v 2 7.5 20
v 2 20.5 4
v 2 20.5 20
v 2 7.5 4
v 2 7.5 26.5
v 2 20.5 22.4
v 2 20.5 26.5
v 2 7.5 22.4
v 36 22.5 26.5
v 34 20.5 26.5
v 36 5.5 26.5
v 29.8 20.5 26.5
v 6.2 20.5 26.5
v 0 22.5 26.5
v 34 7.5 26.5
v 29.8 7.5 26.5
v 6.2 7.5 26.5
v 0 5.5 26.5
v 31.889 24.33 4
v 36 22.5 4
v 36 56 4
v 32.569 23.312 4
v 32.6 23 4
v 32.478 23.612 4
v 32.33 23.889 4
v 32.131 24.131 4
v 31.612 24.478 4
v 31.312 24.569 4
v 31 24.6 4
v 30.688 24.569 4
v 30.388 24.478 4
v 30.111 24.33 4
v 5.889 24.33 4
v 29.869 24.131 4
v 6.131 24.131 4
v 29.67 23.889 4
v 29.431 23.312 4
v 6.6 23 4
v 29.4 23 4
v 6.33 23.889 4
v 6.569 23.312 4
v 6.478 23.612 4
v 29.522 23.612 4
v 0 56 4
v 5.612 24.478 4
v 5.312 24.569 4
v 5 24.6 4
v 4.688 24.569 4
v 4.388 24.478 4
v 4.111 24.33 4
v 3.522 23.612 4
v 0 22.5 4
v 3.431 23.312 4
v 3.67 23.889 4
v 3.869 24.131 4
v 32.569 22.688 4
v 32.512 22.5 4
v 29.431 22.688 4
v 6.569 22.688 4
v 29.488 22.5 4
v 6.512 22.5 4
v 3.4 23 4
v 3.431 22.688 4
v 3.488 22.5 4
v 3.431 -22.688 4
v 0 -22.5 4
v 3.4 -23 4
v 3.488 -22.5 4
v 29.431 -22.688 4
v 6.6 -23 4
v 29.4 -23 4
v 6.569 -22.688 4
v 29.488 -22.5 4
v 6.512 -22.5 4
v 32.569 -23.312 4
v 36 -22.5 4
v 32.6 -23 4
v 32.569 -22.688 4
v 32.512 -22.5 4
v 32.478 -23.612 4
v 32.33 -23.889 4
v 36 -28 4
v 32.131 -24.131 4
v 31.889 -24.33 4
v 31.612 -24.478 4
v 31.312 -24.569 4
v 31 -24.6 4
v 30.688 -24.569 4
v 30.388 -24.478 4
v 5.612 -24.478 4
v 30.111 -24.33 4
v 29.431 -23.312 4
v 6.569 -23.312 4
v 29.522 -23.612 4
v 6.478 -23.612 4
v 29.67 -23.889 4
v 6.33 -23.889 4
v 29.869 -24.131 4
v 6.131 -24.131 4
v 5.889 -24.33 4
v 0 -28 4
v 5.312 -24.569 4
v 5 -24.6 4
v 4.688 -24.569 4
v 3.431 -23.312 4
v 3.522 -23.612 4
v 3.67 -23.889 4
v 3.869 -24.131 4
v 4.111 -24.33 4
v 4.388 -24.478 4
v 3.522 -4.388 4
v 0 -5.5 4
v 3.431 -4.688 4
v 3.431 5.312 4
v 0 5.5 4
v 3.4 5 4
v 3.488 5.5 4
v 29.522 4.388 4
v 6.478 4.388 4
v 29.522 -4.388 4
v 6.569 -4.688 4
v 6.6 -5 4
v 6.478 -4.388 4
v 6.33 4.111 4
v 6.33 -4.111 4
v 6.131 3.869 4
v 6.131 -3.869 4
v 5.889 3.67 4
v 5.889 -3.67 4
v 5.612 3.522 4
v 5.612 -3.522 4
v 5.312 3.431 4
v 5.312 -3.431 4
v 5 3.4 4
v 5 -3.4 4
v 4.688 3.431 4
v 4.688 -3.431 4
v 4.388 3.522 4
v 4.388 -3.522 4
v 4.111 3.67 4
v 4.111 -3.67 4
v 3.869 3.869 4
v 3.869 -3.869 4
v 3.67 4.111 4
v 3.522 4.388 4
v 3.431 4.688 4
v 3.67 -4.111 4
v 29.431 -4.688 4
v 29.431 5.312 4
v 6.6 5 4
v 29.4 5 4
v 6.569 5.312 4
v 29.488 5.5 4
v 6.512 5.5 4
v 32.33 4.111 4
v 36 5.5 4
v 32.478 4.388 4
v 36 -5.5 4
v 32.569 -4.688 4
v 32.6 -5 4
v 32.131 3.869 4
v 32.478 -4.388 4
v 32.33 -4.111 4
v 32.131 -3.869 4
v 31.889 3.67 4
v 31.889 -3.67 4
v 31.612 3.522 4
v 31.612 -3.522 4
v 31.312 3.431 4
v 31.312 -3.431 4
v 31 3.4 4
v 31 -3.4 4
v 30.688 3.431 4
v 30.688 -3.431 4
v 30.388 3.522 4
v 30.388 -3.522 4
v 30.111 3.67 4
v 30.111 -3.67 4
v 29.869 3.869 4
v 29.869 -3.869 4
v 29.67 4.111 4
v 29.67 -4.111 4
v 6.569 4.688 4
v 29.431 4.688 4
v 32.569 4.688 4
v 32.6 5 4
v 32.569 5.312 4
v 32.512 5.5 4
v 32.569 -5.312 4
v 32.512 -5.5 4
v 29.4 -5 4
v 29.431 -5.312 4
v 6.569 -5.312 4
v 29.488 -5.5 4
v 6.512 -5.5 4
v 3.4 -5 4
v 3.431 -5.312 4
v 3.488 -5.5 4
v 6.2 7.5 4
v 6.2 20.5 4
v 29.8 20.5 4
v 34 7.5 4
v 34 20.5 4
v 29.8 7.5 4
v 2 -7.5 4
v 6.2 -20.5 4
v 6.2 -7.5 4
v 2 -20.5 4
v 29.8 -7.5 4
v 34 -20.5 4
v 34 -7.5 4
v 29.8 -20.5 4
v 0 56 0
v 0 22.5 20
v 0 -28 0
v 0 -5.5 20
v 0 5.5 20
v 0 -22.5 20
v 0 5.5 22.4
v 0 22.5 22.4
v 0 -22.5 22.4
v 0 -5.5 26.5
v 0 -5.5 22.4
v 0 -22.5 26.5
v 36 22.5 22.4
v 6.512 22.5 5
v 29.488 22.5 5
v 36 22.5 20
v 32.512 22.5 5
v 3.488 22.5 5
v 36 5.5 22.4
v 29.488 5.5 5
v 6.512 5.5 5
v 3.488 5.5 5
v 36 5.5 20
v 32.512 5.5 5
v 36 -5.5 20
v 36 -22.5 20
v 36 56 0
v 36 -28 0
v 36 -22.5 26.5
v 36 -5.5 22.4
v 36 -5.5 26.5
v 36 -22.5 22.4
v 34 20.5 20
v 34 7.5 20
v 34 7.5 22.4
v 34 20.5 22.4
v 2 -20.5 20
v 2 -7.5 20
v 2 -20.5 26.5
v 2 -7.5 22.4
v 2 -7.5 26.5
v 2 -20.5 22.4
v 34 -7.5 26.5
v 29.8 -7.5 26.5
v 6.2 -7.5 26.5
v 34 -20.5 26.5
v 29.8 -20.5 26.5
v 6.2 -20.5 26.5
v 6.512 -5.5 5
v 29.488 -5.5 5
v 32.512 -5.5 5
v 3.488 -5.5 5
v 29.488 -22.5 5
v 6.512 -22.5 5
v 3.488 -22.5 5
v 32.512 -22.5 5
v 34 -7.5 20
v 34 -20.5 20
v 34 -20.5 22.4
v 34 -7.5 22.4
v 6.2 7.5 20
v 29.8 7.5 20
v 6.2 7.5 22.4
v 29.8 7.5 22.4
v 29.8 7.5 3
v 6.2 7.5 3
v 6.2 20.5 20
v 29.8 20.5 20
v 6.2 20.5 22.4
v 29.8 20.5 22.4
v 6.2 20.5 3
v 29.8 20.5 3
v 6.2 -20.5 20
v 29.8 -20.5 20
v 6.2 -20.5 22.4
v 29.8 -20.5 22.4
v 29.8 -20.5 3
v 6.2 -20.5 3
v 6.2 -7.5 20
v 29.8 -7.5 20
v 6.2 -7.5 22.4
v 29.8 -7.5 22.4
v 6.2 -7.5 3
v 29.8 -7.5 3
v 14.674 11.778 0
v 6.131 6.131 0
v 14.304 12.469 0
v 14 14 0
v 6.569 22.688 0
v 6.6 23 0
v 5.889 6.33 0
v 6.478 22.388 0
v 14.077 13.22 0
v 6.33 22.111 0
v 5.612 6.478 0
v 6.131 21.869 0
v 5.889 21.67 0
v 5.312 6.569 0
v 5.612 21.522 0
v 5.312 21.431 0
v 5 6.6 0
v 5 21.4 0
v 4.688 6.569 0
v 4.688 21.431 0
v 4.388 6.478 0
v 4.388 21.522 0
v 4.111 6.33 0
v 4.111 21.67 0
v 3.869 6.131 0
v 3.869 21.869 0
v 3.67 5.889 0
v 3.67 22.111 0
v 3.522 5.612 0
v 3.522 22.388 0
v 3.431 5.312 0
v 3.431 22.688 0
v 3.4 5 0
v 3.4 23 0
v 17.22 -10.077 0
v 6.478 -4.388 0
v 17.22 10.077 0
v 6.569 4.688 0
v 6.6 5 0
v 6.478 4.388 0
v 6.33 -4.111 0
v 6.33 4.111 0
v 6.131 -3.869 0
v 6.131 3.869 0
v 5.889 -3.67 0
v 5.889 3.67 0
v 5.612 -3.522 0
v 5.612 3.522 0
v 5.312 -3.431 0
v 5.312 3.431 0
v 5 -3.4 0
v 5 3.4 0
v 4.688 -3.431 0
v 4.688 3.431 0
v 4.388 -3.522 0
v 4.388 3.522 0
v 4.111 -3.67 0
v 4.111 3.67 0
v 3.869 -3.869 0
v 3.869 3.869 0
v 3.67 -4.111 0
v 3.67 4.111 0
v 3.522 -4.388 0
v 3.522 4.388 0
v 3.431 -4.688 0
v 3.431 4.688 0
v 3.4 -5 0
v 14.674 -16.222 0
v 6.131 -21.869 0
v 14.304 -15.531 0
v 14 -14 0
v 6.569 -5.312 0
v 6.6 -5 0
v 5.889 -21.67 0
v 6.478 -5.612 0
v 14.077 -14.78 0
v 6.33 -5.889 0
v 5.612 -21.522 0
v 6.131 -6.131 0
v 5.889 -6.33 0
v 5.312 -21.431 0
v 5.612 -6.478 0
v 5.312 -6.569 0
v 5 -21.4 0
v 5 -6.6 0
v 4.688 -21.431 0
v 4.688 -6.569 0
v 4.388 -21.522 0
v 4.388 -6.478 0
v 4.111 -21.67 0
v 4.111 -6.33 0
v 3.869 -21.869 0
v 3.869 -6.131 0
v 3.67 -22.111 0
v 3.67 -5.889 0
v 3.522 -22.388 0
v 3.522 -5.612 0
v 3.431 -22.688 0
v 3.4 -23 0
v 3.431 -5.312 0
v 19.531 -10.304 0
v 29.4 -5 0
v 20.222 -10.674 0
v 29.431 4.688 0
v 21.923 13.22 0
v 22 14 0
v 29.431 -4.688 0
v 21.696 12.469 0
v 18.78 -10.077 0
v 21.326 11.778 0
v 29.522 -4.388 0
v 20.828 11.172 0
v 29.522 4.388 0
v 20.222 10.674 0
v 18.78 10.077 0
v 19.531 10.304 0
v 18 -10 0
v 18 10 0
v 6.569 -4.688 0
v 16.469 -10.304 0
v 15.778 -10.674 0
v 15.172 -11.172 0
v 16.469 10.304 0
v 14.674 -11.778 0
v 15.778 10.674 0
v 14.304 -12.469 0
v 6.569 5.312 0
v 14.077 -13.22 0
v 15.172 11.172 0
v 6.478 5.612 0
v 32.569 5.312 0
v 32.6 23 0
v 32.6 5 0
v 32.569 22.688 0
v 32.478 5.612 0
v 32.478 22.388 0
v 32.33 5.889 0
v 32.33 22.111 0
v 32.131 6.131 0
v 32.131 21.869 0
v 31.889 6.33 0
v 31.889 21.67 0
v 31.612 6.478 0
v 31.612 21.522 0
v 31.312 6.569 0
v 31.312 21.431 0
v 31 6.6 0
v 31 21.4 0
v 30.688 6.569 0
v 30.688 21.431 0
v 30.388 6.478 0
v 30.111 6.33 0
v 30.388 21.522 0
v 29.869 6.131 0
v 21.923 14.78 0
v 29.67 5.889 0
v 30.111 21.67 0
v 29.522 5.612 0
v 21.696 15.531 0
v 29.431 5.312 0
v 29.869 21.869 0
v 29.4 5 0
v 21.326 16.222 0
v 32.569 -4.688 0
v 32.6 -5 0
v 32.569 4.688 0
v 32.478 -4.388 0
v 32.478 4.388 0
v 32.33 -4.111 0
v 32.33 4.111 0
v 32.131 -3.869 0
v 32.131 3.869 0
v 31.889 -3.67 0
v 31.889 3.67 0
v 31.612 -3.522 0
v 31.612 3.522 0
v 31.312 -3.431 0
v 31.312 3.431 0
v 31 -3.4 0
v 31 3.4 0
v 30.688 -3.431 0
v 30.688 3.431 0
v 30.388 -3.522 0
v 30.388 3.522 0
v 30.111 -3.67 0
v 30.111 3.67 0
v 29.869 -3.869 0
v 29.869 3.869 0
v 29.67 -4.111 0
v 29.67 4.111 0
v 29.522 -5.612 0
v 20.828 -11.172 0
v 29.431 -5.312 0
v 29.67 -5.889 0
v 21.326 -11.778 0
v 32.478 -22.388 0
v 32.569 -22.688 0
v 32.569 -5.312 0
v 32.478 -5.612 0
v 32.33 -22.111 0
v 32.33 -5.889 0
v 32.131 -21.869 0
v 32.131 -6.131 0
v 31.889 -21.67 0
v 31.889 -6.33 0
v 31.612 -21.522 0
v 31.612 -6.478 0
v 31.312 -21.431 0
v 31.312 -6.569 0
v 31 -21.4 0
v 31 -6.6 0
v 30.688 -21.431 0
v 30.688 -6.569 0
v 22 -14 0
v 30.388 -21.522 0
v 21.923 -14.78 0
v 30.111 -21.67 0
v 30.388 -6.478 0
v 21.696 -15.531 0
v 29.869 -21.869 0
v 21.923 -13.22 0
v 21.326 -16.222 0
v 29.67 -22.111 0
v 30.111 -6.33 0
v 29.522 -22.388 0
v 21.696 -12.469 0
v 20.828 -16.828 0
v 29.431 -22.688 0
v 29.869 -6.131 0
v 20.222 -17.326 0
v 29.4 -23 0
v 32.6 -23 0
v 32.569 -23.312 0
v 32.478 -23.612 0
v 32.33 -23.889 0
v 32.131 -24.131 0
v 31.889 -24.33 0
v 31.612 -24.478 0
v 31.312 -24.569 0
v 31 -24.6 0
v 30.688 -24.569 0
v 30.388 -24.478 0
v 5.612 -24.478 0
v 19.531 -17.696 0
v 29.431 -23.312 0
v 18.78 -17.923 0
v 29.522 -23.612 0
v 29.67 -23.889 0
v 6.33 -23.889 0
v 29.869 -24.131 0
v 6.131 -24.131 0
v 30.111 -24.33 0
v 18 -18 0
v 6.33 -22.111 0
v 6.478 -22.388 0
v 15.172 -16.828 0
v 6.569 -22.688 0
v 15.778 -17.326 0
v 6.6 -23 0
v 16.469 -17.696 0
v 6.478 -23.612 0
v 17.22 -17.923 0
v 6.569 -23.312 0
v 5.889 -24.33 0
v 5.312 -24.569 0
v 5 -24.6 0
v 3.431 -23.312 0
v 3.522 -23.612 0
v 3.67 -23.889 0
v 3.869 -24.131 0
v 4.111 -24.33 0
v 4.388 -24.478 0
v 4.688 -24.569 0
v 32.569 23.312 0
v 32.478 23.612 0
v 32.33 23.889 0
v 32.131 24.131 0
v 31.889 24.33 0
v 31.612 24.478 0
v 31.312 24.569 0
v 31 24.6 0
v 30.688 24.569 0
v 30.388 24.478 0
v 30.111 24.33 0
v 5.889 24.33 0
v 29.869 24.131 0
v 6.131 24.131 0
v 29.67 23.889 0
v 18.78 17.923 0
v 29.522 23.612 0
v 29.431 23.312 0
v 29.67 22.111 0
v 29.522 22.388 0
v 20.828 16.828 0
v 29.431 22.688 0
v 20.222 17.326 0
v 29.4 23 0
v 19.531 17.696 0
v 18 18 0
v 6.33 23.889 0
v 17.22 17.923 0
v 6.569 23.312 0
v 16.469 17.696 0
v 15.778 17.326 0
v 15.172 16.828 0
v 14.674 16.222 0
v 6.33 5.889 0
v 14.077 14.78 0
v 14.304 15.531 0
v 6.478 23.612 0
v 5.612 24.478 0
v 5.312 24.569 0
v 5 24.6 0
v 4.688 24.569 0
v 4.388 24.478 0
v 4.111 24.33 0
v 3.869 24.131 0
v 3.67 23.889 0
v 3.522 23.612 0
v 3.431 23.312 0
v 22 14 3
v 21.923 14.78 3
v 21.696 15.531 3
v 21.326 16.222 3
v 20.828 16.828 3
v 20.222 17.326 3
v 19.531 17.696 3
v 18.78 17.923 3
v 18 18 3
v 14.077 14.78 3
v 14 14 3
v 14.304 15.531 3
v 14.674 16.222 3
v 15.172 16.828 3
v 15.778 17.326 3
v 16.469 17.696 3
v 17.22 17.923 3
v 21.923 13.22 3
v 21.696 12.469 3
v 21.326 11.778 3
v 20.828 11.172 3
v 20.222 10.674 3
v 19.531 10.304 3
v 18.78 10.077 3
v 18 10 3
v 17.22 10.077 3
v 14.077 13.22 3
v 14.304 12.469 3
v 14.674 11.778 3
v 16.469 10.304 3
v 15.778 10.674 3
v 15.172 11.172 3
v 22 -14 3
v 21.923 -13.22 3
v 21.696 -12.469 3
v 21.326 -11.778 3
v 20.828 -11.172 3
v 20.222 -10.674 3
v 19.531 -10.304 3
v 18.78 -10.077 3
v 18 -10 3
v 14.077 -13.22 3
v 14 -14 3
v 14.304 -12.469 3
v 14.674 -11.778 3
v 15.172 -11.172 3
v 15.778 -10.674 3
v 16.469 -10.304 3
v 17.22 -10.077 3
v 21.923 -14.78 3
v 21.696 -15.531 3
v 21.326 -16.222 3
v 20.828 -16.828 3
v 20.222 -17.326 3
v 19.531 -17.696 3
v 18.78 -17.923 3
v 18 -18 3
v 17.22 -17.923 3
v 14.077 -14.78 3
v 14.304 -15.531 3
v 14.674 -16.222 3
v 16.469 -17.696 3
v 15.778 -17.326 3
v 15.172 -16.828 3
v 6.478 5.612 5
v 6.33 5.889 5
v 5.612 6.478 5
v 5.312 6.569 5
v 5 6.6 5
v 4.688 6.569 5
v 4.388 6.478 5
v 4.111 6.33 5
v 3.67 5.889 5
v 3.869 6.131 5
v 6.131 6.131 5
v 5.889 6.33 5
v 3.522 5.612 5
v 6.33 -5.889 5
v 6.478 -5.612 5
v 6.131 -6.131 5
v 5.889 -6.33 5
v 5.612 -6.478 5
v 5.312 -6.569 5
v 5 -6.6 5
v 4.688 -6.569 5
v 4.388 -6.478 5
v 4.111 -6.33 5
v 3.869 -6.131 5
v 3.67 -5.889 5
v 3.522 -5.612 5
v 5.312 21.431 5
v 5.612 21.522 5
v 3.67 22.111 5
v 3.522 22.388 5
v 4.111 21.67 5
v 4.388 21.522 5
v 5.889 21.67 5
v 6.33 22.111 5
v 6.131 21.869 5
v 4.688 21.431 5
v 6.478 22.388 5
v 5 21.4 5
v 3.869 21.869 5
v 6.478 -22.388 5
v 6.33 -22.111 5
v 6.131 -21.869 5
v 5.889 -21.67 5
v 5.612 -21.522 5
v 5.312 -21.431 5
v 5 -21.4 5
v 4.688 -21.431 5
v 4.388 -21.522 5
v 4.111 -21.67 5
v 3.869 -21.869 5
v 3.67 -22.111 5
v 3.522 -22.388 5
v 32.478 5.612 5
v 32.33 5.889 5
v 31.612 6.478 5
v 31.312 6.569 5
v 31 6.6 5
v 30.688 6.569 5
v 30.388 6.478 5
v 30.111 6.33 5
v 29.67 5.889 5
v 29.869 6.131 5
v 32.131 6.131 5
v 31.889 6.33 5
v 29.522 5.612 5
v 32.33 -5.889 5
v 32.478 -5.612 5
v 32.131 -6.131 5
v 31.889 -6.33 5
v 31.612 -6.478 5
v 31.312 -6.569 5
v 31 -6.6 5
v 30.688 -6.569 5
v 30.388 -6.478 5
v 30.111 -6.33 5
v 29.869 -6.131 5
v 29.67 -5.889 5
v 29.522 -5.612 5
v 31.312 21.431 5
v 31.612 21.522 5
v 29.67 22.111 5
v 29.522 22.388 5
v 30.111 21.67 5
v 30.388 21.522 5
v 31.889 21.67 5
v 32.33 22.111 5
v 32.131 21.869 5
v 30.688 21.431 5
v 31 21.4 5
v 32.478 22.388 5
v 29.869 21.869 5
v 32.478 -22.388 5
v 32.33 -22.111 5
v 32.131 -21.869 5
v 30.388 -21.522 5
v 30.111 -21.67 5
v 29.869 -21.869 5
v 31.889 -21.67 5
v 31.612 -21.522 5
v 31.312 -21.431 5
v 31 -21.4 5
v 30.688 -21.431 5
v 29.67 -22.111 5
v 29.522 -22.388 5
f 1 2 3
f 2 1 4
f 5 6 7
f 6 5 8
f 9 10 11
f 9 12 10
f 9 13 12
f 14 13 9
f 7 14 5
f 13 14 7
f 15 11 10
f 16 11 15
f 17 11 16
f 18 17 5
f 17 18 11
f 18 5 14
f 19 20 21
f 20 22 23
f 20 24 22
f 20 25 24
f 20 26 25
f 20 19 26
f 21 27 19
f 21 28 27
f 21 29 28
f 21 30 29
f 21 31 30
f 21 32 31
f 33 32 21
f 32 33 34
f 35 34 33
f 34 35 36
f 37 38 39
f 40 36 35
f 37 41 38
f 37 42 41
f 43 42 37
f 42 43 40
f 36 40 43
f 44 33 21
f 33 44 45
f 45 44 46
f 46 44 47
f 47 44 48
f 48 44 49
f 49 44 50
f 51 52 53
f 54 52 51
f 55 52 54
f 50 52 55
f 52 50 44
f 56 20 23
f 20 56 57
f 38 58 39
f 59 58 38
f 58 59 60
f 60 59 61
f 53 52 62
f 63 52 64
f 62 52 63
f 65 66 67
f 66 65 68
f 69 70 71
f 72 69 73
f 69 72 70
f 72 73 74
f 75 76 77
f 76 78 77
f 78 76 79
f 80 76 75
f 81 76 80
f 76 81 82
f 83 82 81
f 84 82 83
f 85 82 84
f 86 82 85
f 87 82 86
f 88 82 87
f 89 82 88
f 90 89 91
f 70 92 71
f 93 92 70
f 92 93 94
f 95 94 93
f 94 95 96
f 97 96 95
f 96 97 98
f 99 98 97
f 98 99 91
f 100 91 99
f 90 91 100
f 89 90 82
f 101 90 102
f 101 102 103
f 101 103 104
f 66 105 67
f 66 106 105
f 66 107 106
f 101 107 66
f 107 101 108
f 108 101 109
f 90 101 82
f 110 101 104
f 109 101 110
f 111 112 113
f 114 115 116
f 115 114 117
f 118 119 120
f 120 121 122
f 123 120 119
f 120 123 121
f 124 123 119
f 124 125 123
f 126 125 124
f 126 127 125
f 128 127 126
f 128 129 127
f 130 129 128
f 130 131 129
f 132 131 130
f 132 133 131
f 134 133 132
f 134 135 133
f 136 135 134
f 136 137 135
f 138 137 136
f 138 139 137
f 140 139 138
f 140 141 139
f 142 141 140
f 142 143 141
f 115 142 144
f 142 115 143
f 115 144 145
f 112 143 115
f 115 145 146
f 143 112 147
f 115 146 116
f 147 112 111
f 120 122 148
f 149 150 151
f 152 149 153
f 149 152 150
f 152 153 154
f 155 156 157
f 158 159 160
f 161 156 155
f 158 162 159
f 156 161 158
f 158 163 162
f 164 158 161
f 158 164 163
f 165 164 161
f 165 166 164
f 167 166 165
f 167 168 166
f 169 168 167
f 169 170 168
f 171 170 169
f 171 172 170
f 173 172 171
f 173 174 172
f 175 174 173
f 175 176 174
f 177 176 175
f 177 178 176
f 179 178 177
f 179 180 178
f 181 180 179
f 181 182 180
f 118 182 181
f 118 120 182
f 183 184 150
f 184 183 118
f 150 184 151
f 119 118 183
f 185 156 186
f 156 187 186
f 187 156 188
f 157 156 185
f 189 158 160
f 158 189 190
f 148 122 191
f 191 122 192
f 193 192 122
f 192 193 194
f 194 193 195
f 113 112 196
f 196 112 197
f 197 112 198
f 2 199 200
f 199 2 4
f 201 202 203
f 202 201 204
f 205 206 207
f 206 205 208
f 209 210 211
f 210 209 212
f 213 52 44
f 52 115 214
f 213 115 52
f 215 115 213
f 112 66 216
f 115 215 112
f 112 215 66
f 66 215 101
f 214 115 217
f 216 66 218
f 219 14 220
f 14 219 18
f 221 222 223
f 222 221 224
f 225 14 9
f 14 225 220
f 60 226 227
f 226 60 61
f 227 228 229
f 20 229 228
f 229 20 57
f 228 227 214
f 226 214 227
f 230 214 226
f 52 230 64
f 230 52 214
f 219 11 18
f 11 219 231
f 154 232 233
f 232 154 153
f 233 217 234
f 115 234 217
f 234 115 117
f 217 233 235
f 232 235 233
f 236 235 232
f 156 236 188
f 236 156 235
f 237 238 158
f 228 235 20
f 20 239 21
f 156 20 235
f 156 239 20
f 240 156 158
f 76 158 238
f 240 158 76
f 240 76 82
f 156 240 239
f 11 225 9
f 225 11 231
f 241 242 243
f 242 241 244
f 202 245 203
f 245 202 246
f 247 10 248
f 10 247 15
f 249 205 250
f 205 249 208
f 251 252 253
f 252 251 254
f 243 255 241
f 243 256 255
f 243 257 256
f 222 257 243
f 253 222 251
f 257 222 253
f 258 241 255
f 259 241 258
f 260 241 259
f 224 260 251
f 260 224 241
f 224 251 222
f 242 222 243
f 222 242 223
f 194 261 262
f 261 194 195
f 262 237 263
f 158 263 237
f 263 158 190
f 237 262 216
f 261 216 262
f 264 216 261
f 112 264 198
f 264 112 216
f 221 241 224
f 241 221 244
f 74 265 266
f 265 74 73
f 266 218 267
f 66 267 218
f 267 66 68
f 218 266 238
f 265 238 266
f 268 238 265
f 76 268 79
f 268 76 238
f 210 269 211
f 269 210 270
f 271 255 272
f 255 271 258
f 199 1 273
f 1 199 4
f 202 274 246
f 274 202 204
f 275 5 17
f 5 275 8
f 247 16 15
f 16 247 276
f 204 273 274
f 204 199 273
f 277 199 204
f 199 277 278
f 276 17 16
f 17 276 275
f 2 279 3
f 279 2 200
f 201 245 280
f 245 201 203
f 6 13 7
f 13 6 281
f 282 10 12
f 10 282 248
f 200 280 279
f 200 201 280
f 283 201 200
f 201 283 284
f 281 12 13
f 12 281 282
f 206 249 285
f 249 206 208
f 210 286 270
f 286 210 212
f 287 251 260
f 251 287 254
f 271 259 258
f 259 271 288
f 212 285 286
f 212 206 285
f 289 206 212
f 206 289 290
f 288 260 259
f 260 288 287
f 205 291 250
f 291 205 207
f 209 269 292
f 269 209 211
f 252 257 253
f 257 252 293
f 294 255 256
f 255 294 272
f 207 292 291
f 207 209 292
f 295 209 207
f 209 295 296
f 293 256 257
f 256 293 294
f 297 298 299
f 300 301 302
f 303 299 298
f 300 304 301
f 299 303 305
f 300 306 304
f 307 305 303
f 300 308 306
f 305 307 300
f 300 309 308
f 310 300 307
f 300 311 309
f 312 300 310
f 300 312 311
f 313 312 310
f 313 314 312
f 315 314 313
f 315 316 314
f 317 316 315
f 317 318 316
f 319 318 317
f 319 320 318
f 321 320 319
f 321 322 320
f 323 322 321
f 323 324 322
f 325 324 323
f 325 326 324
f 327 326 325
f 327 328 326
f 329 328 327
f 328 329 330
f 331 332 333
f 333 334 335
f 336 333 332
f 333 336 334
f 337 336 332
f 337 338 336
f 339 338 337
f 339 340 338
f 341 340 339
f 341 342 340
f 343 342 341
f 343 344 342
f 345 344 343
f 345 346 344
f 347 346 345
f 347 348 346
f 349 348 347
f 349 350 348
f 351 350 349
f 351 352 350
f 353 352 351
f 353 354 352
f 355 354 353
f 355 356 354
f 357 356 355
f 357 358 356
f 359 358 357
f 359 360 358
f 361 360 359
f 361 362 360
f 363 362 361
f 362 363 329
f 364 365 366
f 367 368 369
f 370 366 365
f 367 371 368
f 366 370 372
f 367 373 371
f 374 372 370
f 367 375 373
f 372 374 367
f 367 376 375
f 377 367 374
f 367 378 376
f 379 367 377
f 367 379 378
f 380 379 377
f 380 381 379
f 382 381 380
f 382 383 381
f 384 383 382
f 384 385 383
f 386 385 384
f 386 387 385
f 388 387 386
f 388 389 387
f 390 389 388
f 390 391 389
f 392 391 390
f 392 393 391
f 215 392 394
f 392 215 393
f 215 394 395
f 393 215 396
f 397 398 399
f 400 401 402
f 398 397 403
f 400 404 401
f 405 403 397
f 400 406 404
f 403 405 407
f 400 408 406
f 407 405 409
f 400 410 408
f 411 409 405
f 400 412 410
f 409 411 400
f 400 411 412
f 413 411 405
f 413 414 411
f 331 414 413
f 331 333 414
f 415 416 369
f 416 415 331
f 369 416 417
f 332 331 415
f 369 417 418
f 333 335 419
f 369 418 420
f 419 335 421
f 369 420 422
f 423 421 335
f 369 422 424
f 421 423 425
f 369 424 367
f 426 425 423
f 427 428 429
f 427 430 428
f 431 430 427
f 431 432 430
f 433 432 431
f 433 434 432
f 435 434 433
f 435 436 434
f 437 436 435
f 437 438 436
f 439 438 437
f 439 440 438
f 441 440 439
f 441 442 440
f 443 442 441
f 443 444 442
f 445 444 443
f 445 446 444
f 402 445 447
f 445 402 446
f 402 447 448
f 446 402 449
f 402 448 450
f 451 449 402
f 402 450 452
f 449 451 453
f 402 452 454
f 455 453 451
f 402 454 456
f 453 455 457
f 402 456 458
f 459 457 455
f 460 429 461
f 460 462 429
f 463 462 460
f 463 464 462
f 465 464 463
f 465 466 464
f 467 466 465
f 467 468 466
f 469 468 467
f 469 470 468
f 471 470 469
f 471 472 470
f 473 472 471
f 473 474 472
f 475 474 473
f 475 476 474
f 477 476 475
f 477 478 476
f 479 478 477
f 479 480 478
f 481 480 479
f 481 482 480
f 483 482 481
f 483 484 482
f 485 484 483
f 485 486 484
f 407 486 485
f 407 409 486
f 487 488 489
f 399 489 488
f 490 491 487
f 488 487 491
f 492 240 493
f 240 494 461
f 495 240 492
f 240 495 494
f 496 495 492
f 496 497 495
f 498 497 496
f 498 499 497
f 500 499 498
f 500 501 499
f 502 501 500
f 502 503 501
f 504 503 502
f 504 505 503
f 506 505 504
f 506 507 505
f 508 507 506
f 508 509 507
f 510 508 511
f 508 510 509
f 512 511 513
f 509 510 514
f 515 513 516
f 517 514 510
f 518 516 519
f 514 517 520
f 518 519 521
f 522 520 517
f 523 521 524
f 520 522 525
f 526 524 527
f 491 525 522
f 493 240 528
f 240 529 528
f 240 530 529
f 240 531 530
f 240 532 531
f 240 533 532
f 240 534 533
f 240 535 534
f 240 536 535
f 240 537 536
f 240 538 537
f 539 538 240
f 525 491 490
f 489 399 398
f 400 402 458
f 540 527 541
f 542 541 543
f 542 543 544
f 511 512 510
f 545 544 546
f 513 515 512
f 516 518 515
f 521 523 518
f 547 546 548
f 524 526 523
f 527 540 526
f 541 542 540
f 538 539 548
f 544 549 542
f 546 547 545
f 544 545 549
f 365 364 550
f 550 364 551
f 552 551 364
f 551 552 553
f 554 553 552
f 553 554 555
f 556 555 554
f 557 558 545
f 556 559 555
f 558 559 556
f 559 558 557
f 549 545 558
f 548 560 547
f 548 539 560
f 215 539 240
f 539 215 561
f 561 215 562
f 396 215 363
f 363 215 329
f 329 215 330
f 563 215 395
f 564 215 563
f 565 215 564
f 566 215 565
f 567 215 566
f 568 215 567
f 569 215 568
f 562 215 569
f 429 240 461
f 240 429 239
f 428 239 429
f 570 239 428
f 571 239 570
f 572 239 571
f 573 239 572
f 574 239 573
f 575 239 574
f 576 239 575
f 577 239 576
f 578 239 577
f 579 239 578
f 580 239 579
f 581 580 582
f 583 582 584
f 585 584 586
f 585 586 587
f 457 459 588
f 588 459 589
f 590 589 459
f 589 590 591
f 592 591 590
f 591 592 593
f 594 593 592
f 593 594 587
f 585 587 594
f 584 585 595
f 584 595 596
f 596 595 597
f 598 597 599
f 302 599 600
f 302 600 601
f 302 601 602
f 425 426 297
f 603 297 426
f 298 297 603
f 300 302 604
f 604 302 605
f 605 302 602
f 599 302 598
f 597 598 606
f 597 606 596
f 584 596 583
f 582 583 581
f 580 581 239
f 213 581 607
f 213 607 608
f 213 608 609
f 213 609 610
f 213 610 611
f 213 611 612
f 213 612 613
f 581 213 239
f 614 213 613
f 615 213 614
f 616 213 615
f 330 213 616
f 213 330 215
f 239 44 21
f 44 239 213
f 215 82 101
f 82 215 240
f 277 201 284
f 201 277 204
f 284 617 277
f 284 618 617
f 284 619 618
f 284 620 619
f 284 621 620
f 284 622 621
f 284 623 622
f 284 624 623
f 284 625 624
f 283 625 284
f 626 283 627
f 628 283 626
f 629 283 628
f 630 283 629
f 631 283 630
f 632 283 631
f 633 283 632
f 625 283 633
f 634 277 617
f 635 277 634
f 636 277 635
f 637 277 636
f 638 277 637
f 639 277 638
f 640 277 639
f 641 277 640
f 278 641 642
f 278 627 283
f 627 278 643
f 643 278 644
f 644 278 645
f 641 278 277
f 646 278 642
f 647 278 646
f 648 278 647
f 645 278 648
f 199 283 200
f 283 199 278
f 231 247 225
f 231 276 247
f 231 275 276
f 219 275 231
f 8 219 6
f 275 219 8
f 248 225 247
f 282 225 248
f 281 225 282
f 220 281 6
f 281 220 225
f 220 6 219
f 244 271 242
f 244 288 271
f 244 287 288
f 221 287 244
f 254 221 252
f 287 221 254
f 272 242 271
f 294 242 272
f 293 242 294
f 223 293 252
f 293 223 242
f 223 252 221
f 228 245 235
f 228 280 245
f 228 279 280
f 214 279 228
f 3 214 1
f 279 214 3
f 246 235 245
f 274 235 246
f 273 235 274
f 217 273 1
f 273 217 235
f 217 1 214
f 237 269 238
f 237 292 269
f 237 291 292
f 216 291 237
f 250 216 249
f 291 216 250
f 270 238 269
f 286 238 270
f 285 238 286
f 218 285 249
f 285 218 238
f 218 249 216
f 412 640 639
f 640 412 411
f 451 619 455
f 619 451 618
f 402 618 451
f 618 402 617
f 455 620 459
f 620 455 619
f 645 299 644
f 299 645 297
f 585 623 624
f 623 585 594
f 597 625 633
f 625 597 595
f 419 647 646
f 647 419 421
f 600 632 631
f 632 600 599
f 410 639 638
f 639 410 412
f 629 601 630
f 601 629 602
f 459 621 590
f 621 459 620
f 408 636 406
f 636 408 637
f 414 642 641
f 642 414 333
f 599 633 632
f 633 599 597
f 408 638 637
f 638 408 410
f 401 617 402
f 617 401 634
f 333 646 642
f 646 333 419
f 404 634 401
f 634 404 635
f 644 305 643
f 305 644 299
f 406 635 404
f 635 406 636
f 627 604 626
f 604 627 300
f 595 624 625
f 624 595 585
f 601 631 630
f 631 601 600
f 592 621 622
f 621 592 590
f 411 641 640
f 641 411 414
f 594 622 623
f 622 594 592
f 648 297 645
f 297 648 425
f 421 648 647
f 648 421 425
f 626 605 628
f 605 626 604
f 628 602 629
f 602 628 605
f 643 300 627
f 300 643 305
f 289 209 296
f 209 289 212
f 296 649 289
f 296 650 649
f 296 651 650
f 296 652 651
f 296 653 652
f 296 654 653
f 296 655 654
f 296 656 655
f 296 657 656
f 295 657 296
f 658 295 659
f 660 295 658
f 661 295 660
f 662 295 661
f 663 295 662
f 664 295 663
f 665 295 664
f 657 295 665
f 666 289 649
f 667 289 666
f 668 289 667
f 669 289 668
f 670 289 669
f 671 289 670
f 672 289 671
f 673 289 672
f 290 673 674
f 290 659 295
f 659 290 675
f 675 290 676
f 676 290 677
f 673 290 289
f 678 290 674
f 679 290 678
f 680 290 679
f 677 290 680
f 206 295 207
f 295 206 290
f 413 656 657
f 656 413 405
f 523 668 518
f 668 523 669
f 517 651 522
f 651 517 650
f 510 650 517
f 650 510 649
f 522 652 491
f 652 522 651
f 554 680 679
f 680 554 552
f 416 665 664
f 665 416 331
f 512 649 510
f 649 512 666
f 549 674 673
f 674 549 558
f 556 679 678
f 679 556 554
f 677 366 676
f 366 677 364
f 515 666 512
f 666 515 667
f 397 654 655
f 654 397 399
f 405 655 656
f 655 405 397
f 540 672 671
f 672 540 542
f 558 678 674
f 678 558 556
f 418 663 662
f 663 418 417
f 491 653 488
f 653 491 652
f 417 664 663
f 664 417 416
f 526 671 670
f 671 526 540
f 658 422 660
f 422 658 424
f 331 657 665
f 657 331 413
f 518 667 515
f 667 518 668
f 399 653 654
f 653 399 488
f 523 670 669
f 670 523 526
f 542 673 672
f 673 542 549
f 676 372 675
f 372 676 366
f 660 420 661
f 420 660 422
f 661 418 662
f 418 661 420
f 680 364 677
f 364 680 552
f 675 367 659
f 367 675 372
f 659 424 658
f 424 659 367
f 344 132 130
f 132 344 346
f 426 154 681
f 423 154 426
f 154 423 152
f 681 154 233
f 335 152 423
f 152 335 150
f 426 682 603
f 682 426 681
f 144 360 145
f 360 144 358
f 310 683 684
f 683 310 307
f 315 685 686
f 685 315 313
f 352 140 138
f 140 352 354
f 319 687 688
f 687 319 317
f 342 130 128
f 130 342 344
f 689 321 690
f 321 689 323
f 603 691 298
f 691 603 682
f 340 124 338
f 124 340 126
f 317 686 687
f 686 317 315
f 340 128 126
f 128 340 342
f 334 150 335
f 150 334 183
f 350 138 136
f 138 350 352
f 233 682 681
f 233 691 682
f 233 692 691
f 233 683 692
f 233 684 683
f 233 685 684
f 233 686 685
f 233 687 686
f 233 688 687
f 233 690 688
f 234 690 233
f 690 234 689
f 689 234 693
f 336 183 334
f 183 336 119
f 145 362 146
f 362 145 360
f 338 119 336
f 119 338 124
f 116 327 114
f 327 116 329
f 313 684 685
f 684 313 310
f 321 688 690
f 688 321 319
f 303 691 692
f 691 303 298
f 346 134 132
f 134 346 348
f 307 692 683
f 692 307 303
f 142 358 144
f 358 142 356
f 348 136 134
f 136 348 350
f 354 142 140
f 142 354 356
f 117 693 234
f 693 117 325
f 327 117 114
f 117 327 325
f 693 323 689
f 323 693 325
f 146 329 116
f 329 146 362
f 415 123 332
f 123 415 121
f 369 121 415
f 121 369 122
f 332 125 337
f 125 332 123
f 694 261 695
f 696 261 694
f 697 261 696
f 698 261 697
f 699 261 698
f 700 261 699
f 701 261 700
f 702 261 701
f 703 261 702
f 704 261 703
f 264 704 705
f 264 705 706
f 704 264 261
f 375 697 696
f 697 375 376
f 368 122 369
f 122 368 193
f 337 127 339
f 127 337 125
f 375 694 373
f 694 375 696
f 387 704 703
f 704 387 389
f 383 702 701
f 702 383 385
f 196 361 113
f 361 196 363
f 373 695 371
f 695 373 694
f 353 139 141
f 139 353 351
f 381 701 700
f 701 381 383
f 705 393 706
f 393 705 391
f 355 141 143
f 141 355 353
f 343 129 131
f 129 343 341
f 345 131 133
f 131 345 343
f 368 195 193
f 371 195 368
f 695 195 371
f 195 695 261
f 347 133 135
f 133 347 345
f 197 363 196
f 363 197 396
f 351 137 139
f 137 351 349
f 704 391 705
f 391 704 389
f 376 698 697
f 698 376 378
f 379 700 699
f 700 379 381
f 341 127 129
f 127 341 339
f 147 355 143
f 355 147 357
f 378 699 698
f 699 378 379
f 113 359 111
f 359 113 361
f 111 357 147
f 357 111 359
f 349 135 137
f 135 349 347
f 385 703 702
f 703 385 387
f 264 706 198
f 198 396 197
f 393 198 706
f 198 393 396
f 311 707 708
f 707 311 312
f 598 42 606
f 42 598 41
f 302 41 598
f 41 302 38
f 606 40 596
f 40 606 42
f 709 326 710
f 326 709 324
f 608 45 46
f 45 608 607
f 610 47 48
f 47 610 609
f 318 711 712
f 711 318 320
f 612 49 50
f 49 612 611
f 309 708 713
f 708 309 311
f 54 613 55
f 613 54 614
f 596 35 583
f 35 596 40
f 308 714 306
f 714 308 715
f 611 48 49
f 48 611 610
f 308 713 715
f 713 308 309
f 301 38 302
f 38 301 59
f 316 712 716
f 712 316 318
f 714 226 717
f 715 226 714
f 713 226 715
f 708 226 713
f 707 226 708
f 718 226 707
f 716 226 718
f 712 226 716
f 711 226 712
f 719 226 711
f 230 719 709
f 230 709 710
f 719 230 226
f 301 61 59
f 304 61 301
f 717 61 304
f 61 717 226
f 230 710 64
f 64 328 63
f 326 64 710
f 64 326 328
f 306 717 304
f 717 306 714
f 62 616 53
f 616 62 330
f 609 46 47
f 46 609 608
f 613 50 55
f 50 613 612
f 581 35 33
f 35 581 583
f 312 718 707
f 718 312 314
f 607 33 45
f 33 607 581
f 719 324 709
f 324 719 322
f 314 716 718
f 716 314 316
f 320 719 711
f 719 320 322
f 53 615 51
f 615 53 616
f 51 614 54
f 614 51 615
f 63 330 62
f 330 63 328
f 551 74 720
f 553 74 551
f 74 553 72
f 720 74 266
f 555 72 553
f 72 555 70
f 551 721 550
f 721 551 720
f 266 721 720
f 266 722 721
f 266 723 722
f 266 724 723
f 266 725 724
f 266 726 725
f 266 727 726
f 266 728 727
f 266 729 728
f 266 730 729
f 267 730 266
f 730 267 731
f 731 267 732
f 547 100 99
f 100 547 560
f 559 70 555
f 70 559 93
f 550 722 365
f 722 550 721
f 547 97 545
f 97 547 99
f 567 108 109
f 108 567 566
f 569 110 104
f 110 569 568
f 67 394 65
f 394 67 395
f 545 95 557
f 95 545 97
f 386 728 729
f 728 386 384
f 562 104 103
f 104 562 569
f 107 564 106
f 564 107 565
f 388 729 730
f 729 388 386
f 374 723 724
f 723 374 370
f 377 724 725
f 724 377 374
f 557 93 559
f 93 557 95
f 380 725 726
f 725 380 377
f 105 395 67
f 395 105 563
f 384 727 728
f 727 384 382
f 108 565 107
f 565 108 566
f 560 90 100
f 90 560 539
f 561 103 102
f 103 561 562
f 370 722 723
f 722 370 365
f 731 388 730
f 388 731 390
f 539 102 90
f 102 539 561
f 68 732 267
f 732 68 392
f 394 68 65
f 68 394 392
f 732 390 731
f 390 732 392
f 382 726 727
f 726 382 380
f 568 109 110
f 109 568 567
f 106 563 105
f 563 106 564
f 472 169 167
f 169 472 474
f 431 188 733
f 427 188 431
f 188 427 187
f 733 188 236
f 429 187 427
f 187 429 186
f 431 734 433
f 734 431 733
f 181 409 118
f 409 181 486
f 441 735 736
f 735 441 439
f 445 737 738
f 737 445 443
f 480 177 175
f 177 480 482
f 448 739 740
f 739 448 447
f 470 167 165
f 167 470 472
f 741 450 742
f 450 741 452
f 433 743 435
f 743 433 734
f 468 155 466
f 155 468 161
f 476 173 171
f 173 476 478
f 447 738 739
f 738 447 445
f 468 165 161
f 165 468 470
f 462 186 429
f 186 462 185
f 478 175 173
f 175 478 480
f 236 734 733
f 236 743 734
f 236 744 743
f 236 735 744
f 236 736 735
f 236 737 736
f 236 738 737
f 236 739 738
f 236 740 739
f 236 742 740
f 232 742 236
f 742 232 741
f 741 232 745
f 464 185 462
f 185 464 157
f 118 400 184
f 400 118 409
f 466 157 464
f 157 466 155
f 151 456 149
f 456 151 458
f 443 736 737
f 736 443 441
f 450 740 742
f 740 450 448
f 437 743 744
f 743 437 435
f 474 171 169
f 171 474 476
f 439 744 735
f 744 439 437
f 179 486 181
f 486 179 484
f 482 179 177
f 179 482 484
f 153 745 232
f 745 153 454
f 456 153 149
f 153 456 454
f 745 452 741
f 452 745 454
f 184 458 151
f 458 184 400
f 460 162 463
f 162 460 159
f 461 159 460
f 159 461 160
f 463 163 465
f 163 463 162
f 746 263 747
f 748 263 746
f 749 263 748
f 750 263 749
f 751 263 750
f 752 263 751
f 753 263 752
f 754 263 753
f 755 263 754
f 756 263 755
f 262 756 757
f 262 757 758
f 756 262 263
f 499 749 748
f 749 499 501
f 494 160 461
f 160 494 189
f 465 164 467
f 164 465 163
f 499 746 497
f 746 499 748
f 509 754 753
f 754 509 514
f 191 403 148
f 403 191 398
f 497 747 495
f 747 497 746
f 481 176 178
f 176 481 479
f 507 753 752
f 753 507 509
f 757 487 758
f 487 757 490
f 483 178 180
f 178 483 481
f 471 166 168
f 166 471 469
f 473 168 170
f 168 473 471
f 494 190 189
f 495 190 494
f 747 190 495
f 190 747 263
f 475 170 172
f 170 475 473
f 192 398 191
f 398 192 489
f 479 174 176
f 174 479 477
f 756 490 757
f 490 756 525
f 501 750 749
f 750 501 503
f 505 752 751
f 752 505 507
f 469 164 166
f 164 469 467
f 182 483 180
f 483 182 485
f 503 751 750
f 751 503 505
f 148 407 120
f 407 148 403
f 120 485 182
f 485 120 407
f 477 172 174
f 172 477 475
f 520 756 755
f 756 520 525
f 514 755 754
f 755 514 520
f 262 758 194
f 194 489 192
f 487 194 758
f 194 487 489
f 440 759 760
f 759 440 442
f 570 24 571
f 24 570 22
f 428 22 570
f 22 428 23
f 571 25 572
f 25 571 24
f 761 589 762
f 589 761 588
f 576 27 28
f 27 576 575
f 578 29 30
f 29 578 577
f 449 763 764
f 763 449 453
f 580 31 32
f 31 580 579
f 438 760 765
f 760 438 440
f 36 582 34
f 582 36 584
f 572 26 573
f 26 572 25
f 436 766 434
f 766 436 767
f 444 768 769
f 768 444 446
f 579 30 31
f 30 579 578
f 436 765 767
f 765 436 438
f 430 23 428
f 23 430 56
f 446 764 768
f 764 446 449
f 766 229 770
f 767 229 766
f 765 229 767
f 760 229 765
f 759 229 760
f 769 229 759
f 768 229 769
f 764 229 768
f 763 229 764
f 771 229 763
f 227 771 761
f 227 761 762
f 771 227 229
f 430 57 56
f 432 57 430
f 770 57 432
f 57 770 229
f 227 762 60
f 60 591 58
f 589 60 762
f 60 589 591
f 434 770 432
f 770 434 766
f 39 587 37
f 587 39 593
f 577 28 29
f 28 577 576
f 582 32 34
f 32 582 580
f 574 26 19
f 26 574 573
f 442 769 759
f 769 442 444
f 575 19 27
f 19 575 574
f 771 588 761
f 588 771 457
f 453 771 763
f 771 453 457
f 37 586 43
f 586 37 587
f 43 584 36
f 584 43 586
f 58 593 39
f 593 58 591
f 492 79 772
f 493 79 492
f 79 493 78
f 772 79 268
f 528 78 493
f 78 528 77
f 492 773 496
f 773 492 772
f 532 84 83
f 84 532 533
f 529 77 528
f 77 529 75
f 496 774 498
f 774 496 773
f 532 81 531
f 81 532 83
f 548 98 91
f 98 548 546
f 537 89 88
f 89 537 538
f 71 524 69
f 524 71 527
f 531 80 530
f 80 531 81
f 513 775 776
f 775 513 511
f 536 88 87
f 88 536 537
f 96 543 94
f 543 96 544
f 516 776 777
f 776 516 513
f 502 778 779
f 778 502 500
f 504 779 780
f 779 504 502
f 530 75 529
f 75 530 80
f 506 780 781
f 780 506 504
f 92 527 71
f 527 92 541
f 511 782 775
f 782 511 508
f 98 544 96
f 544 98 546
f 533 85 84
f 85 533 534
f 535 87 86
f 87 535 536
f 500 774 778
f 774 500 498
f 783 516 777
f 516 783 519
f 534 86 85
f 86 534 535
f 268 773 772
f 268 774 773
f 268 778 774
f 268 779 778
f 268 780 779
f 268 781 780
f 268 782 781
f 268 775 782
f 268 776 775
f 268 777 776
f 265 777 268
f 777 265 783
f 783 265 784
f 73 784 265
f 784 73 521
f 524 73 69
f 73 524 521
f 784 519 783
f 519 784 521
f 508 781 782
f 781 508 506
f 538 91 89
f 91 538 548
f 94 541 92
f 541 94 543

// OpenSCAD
// Montazni deska pro serva kormidel (elevator + rudder)
// Micro servo MG90S/SG90 (9g, 22.8x12.2x25.4mm)
// Umisteni: uvnitr trup_zadni, X=320-340mm od predni strany
// Material: PET-G, 30% vypln, 4 perimetry
// Fixace: epoxid na vnitrni stenu trupu

$fn = 32;

// Rozměry serva MG90S
servo_dl = 22.8;
servo_sir = 12.2;
servo_v = 25.4;   // vcetne hrídele
servo_v_telo = 22.5; // telo bez hrídele
servo_priruba_sirka = 32.5;
servo_priruba_v = 2;
servo_priruba_pos = 16; // od spodku tela
vule = 0.4;

// Rozmery desky
deska_tl = 4;       // tloustka zakladny
deska_sirka = 56;   // v ose Y (dve serva vedle sebe + okraje)
deska_delka = 36;   // v ose X (podél trupu)
vyska = servo_v_telo + deska_tl + 2; // celkova vyska modulu

// Pozice serv na desce (v ose Y)
// Servo 1: vyskove kormidlo (levy pohled - Y > 0)
// Servo 2: smerove kormidlo (pravy pohled - Y < 0)
pos_elevator_y = 14;   // stred serva od středu desky
pos_rudder_y  = -14;

module servo_bay(cy) {
    translate([deska_delka/2, cy, deska_tl])
        difference() {
            // Obal serva (s pridanou vulit)
            translate([-(servo_dl/2 + vule), -(servo_sir/2 + vule), 0])
                cube([servo_dl + 2*vule, servo_sir + 2*vule, servo_v_telo + 2]);
        }
}

module servo_mount_kormidla() {
    difference() {
        union() {
            // Zakladni deska
            cube([deska_delka, deska_sirka, deska_tl], center=false);
            translate([0, -deska_sirka/2, 0])
                cube([deska_delka, deska_sirka, deska_tl], center=false);

            // Bocnice drzici serva
            for (cy = [pos_elevator_y, pos_rudder_y]) {
                // Levy bok
                translate([0, cy - servo_sir/2 - vule - 2, deska_tl])
                    cube([deska_delka, 2, servo_v_telo]);
                // Pravy bok
                translate([0, cy + servo_sir/2 + vule, deska_tl])
                    cube([deska_delka, 2, servo_v_telo]);
                // Predni a zadni retencni stena (2mm)
                for (dx = [0, deska_delka - 2]) {
                    translate([dx, cy - servo_sir/2 - vule - 2, deska_tl])
                        cube([2, servo_sir + 2*vule + 4, servo_v_telo]);
                }
            }
        }

        // Vyprazdneni kapes serv (open-top)
        for (cy = [pos_elevator_y, pos_rudder_y]) {
            translate([(deska_delka - servo_dl)/2 - vule, cy - servo_sir/2 - vule, deska_tl - 1])
                cube([servo_dl + 2*vule, servo_sir + 2*vule, servo_v_telo + 3]);

            // Slot pro prisrubu serva
            translate([-1, cy - servo_priruba_sirka/2, deska_tl + servo_priruba_pos])
                cube([deska_delka + 2, servo_priruba_sirka, servo_priruba_v + vule]);

            // Otvor pro kabel (spodek kapsy)
            translate([deska_delka/2, cy, -1])
                cylinder(d=8, h=deska_tl + 2);
        }

        // M3 montazni otvory v rozich desky (pro fixaci do trupu)
        for (dx = [5, deska_delka - 5]) {
            for (dy = [5, deska_sirka/2 - 5]) {
                translate([dx, dy, -1])
                    cylinder(d=3.2, h=deska_tl + 2);
                translate([dx, -dy, -1])
                    cylinder(d=3.2, h=deska_tl + 2);
            }
        }
    }
}

servo_mount_kormidla();
